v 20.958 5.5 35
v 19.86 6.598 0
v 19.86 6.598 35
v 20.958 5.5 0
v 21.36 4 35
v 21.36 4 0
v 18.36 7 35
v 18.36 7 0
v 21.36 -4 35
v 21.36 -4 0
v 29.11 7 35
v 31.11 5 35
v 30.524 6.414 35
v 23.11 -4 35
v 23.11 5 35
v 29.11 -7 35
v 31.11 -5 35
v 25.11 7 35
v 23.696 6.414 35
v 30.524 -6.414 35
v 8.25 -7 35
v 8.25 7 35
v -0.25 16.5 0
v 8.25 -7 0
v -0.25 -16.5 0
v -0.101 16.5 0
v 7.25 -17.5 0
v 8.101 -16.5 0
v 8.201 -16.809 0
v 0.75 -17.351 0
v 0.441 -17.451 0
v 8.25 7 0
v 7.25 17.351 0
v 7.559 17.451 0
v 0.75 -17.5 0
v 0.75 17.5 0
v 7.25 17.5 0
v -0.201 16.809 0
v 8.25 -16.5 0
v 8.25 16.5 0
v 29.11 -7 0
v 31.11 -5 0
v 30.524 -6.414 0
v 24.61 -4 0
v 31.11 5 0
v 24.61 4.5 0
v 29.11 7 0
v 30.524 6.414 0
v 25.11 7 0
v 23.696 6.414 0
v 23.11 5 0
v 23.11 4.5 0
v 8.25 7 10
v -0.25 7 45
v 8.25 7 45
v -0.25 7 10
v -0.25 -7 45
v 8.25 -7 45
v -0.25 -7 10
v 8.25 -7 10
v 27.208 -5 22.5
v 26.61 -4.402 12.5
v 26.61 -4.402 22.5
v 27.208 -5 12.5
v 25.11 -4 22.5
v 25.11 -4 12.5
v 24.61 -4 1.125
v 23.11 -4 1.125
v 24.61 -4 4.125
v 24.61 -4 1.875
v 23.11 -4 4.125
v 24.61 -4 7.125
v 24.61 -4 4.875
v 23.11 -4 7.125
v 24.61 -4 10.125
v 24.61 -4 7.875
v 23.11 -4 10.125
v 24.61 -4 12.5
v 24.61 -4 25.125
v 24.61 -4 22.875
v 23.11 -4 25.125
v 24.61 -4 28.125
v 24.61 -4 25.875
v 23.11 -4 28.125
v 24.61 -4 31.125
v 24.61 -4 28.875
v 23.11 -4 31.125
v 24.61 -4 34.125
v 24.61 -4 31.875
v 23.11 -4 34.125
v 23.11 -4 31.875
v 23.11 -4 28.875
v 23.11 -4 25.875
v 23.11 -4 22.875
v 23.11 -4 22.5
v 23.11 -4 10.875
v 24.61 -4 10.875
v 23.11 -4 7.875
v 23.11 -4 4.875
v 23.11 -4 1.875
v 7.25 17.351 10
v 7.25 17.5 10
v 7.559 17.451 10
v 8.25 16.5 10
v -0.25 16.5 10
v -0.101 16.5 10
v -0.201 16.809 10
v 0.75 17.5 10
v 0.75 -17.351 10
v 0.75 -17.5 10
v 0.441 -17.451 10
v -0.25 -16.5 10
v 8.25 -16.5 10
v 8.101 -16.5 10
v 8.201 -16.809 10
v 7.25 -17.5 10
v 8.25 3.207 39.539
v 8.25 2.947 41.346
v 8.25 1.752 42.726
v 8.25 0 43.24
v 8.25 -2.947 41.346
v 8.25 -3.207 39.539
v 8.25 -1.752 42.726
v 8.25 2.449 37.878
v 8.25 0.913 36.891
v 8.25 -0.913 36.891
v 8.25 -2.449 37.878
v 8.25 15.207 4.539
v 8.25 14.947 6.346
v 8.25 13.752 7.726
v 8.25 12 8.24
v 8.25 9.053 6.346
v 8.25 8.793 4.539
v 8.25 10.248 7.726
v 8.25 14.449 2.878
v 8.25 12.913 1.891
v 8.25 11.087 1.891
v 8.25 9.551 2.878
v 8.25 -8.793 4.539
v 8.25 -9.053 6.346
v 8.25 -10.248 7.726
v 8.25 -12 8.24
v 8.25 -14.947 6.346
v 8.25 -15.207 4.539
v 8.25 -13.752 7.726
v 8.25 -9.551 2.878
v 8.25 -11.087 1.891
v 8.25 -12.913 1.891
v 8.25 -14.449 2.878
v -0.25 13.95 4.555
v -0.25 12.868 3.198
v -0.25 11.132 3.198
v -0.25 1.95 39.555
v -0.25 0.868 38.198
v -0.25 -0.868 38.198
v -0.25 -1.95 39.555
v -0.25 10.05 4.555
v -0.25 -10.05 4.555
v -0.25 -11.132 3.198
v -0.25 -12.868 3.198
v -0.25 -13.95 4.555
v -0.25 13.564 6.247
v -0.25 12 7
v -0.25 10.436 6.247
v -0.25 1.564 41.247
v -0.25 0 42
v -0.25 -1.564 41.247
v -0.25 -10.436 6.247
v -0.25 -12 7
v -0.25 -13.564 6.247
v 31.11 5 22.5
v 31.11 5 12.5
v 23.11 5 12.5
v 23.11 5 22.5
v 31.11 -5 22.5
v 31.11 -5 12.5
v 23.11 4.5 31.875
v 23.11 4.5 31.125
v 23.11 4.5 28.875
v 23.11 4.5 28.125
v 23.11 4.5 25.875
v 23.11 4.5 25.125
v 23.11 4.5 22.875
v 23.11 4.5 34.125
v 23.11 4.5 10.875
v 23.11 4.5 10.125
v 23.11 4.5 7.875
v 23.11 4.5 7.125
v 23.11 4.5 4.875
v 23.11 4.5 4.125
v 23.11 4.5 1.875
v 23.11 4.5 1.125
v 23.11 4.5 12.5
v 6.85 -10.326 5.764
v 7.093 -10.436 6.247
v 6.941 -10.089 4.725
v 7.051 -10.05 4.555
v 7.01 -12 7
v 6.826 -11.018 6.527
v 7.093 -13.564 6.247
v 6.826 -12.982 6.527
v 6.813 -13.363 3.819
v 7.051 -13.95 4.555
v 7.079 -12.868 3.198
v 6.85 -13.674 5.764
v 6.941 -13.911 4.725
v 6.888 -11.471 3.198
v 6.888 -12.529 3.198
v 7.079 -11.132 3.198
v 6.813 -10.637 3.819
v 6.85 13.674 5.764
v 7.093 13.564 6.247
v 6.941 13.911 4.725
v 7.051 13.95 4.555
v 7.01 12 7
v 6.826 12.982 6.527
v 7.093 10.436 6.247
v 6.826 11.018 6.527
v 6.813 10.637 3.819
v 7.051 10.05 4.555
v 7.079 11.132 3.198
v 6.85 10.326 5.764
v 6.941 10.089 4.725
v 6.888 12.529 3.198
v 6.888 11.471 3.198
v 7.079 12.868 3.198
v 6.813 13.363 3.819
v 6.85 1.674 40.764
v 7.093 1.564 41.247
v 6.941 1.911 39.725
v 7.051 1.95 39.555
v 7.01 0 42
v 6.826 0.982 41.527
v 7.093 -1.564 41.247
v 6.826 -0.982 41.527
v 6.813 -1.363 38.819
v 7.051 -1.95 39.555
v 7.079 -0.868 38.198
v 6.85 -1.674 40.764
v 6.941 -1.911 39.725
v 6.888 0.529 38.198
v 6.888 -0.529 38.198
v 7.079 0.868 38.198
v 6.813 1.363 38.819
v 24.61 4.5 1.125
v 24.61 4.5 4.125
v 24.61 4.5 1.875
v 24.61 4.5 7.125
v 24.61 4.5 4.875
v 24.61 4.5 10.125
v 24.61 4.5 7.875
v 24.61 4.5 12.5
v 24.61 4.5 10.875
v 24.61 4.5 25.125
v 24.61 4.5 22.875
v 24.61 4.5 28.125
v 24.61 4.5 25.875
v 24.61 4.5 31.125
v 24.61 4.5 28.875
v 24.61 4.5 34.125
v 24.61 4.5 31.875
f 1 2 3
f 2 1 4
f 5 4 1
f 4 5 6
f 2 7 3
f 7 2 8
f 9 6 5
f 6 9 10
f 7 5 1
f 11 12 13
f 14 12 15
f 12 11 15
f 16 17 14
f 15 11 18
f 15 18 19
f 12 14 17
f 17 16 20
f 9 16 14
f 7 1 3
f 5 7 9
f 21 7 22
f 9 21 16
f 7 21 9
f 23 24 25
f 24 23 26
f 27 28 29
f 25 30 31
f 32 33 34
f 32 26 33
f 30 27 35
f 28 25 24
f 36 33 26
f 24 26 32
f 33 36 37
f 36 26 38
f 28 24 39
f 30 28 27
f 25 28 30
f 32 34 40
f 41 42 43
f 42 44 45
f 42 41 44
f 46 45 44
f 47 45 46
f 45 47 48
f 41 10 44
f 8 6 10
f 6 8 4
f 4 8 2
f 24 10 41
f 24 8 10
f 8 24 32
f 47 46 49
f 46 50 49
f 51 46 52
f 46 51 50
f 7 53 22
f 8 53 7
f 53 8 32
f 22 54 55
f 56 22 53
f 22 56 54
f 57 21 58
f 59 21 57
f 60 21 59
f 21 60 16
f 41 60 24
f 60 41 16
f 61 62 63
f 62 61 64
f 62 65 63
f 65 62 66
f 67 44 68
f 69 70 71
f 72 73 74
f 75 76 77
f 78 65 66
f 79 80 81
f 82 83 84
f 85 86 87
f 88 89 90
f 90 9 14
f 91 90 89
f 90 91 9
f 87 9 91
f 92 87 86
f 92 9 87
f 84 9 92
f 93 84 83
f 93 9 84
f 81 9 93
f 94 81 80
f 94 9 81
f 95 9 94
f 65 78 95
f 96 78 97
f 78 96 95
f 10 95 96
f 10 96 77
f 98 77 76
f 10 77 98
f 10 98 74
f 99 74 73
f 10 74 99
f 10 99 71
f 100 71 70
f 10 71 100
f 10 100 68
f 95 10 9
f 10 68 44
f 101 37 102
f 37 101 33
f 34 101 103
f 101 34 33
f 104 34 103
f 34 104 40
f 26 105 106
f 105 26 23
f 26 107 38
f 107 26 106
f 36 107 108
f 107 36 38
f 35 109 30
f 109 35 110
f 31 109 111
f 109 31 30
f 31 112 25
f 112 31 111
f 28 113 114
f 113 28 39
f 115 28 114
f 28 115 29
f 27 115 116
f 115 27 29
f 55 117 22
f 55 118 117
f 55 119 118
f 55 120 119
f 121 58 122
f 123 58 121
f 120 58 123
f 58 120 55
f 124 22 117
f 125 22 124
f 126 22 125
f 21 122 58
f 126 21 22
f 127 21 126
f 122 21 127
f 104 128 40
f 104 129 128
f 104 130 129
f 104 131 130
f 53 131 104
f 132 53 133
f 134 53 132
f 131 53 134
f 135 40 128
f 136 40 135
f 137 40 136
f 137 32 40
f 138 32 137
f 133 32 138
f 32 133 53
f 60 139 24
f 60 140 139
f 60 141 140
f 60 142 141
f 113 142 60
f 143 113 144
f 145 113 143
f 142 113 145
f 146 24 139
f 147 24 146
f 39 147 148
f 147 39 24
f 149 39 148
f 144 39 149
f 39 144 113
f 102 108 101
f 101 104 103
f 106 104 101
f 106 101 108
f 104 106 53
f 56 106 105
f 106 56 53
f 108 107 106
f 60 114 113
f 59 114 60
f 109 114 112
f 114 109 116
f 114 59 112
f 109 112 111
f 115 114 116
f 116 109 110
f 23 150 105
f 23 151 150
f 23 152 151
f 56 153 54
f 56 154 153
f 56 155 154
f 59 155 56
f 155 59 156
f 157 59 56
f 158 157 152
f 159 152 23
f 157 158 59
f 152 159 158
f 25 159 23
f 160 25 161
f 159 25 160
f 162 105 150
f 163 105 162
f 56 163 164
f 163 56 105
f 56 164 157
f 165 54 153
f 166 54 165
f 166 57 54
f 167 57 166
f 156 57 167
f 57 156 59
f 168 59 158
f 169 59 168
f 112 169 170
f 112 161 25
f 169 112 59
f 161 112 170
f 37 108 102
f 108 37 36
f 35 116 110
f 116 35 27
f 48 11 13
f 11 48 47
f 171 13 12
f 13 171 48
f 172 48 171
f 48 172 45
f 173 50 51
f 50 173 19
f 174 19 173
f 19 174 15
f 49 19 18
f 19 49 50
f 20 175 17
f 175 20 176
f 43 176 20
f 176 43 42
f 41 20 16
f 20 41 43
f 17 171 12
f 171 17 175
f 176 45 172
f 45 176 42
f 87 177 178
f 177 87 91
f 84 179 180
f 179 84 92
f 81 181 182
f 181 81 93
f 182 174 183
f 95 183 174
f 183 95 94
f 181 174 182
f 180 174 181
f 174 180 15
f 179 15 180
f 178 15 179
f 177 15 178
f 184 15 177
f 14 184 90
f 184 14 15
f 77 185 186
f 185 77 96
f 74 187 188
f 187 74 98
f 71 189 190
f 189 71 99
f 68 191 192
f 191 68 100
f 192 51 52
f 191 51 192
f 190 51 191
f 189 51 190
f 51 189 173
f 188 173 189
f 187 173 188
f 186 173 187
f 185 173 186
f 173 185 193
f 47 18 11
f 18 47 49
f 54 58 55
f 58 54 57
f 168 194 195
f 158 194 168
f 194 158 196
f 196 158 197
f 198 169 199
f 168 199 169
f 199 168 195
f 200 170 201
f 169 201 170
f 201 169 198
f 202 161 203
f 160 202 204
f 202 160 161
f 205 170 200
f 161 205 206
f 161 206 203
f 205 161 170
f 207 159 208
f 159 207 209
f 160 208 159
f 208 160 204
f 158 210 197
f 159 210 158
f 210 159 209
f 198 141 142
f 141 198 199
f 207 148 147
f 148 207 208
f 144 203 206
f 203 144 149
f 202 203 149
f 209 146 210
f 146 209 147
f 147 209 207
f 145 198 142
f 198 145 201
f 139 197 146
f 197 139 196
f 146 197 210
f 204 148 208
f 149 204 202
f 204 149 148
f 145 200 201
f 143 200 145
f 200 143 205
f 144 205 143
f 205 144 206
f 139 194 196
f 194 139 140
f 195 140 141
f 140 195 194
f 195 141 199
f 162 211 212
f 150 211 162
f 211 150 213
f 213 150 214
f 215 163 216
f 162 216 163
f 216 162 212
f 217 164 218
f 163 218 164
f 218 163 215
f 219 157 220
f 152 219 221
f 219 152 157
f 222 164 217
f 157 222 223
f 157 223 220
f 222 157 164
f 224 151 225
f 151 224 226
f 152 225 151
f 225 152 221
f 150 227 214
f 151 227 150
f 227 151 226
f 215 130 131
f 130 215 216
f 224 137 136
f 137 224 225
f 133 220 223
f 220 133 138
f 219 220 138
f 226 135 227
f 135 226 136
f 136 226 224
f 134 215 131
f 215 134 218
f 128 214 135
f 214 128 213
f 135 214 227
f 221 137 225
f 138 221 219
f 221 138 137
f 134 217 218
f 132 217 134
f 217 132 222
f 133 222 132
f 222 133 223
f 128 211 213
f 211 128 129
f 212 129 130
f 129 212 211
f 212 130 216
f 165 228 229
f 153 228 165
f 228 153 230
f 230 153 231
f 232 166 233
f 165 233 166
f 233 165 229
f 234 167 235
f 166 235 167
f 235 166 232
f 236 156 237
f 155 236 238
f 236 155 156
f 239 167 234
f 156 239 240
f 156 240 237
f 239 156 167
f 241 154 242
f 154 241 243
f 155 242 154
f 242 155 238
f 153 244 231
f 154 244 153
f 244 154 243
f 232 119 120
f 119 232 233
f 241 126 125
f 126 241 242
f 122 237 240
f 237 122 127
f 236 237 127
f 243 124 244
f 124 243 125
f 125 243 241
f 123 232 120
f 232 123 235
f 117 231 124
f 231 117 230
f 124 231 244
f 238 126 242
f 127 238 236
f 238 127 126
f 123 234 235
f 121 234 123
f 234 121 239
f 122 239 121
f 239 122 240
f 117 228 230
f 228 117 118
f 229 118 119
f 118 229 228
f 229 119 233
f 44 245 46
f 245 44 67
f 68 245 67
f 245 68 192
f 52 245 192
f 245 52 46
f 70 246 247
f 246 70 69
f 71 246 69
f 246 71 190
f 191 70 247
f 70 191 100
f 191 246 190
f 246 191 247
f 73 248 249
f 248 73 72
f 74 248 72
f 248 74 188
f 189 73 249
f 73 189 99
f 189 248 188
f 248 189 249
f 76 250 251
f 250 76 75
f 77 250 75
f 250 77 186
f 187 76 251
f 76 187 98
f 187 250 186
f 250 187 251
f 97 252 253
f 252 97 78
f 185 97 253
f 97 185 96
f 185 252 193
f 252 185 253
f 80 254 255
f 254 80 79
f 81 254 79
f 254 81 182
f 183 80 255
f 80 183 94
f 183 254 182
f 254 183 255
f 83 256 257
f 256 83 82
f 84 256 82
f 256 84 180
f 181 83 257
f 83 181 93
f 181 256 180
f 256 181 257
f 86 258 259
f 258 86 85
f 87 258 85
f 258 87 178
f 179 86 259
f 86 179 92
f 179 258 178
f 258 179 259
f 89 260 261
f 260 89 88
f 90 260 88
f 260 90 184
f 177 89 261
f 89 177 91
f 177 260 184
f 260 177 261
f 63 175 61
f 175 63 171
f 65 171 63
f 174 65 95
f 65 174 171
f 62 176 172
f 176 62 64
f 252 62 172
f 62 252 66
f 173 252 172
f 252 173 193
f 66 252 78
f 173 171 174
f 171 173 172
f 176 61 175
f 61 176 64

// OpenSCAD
// file: inc/functions.scad
// PRUSA iteration3
// Functions used in many files
// GNU GPL v3
// Josef Průša <josefprusa@me.com>
// Václav 'ax' Hůla <axtheb@gmail.com>
// Vlnofka <>
// http://www.reprap.org/wiki/Prusa_Mendel
// http://github.com/prusajr/PrusaMendel


module nut(d,h,horizontal=true){
    cornerdiameter =  (d / 2) / cos (180 / 6);
    cylinder(h = h, r = cornerdiameter, $fn = 6);
    if(horizontal){
        for(i = [1:6]){
            rotate([0,0,60*i]) translate([-cornerdiameter-0.2,0,0]) rotate([0,0,-45]) cube([2,2,h]);
        }
    }
}

module fillet(radius, height=100, $fn=0) {
    //this creates acutal fillet
    translate([-radius, -radius, -height / 2 - 0.02]) difference() {
        cube([radius * 2, radius * 2, height + 0.04]);
        if ($fn == 0 && (radius == 2 || radius == 3 || radius == 4)) {
            cylinder(r=radius, h=height + 0.04, $fn=4 * radius);
        } else {
            cylinder(r=radius, h=height + 0.04, $fn=$fn);
        }

    }
}

module cube_fillet(size, radius=-1, vertical=[3,3,3,3], top=[0,0,0,0], bottom=[0,0,0,0], center=false, $fn=0){
    //
    if (use_fillets == 1) {
        if (center) {
            cube_fillet_inside(size, radius, vertical, top, bottom, $fn);
        } else {
            translate([size[0]/2, size[1]/2, size[2]/2])
                cube_fillet_inside(size, radius, vertical, top, bottom, $fn);
        }
    } else {
        if (use_fillets == 2) {
            if (center) {
                cube_fillet_inside(size, radius, vertical, top, bottom, 4);
            } else {
                translate([size[0]/2, size[1]/2, size[2]/2])
                    cube_fillet_inside(size, radius, vertical, top, bottom, 4);
            }

        } else {
            cube(size, center);
        }
    }

}

module cube_negative_fillet(size, radius=-1, vertical=[3,3,3,3], top=[0,0,0,0], bottom=[0,0,0,0], $fn=0){

    j=[1,0,1,0];

    for (i=[0:3]) {
        if (radius > -1) {
            rotate([0, 0, 90*i]) translate([size[1-j[i]]/2, size[j[i]]/2, 0]) fillet(radius, size[2], $fn=$fn);
        } else {
            rotate([0, 0, 90*i]) translate([size[1-j[i]]/2, size[j[i]]/2, 0]) fillet(vertical[i], size[2], $fn=$fn);
        }
        rotate([90*i, -90, 0]) translate([size[2]/2, size[j[i]]/2, 0 ]) fillet(top[i], size[1-j[i]], $fn=$fn);
        rotate([90*(4-i), 90, 0]) translate([size[2]/2, size[j[i]]/2, 0]) fillet(bottom[i], size[1-j[i]], $fn=$fn);

    }
}

module cube_fillet_inside(size, radius=-1, vertical=[3,3,3,3], top=[0,0,0,0], bottom=[0,0,0,0], $fn=0){
    //makes CENTERED cube with round corners
    // if you give it radius, it will fillet vertical corners.
    //othervise use vertical, top, bottom arrays
    //when viewed from top, it starts in upper right corner (+x,+y quadrant) , goes counterclockwise
    //top/bottom fillet starts in direction of Y axis and goes CCW too


    if (radius == 0) {
        cube(size, center=true);
    } else {
        difference() {
            cube(size, center=true);
            cube_negative_fillet(size, radius, vertical, top, bottom, $fn);
        }
    }
}


module nema17(places=[1,1,1,1], size=15.5, h=10, holes=false, shadow=false, $fn=24){
    for (i=[0:3]) {
        if (places[i] == 1) {
            rotate([0, 0, 90*i]) translate([size, size, 0]) {
                if (holes) {
                    rotate([0, 0, -90*i])  translate([0,0,-10]) screw(r=1.7, slant=false, head_drop=13, $fn=$fn, h=h+12);
                } else {
                    rotate([0, 0, -90*i]) cylinder(h=h, r=5.5, $fn=$fn);
                }
            }
        }
    }
    if (shadow != false) {
        %translate ([0, 0, shadow+21+3]) cube([42,42,42], center = true);
    //flange
        %translate ([0, 0, shadow+21+3-21-1]) cylinder(r=11,h=2, center = true, $fn=20);
    //shaft
        %translate ([0, 0, shadow+21+3-21-7]) cylinder(r=2.5,h=14, center = true);
    }
}

module screw(h=20, r=2, r_head=3.5, head_drop=0, slant=i_am_box, poly=false, $fn=0){
    //makes screw with head
    //for substraction as screw hole
    if (poly) {
        cylinder_poly(h=h, r=r, $fn=$fn);
    } else {
        cylinder(h=h, r=r, $fn=$fn);
    }
    if (slant) {
        translate([0, 0, head_drop-0.01]) cylinder(h=r_head, r2=0, r1=r_head, $fn=$fn);
    }

    if (head_drop > 0) {
        translate([0, 0, -0.01]) cylinder(h=head_drop+0.01, r=r_head, $fn=$fn);
    }
}

module plate_screw(long=0) {
    if (i_am_box == 0) {
        translate([0, 0, -long]) screw(head_drop=14 + long, h=30 + long, r_head=3.6, r=1.7, $fn=24, slant=false);
    } else {
        translate([0, 0, -2 - long]) screw(head_drop=14 + long, h=30 + long, r_head=4.5, r=2, $fn=24, slant=true);
    }
}

//radius of the idler assembly (to surface that touches belt, ignoring guide walls)
function idler_assy_r_inner(idler_bearing) = (idler_bearing[0] / 2) + (6 * single_wall_width + 0.2) * idler_bearing[3];
//outer radius of the idler assembly (to smooth side of belt) 
function idler_assy_r_outer(idler_bearing) = idler_assy_r_inner(idler_bearing) + belt_thickness + 1;


module idler_assy(idler_bearing = [22, 7, 8, 1]) {

    //bearing axle
    translate([0,0,-1]) cylinder(h = 120, r=(idler_bearing[2] + 1) / 2, $fn=small_hole_segments, center=true);
    //bearing shadow
    %cylinder(h = idler_bearing[1], r=idler_bearing[0]/2, center=true);
    //belt shadow
    %cylinder(h = belt_width, r=idler_assy_r_outer(idler_bearing), center=true);

    cylinder(h = idler_width + 1, r=idler_assy_r_outer(idler_bearing) + 0.5, center=true);
}

module belt(len, side = 0){
    //belt. To be substracted from model
    //len is in +Z, smooth side in +X, Y centered
    translate([-0.5, 0, 0]) maketeeth(len);
    translate([0, -4.5, -0.01]) cube([belt_thickness, 9, len + 0.02]);
    if (side != 0) {
    translate([0, -4.5 + side, -0.01]) cube_fillet([belt_thickness, 9, len + 0.02], vertical = [3, 0, 0, 0]);
    }
}


module maketeeth(len){
    //Belt teeth. 
    for (i = [0 : len / belt_tooth_distance]) {
        translate([0, 0, i * belt_tooth_distance]) cube([2, 9, belt_tooth_distance * belt_tooth_ratio], center = true);
    }
}
// file: inc/conf_bushing.scad
// PRUSA iteration3
// Bushing and bering dimensions
// GNU GPL v3
// Václav 'ax' Hůla <axtheb@gmail.com>
// http://www.reprap.org/wiki/Prusa_Mendel
// http://github.com/prusajr/PrusaMendel
//

// each config is in form[r_rod, r, h, type, name] where:
//     r_rod  is smooth rod radius [0]
//     r is outer bushing radius needed for tight fit or bearing radius with loose fit [1]
//     h is barrel length [2]
//     type is 0 for linear bearings, 1 is for bushings which needs to be enclosed fully. [3]
//       type 1 may have flange, but type 0 not
//     name is human readable name [4]

//bushings
conf_b_bushing8 = [4, 5.1, 10, 1, "Tube shaped bushing like igus J(V)FM 0810-10"];
conf_b_bushing10 = [5, 6.1, 10, 1, "Tube shaped bushing with id=10mm, od=12mm and length of at least 10mm, like J(V)FM 1012-10"];
conf_b_bushing12 = [6, 7.1, 15, 1, "Tube shaped bushing with id=12mm, od=14mm and length of at least 15mm, like SF-1 1215"];

conf_b_bronze8 = [4, 8, 11, 1, "bronze self-aligning bushing, 8mm"];

//shorter beaings (two on each Z axis)
conf_b_lm8uu = [4, 7.7, 24, 0, "lm8uu bearing (standard)"];
conf_b_lm10uu = [5, 9.7, 29, 0, "lm10uu bearing (10mm smooth rod)"];
conf_b_lme8uu =[4, 8.2, 25, 0, "lme8uu bearing"];
conf_b_lm12uu = [6, 10.6, 30, 0, "lm12uu bearing (12mm smooth rod)"];

//longer bearings
conf_b_lm8luu = [4, 7.7, 45, 0, "lm8luu bearing (double length)"];
conf_b_lm10luu = [5, 9.7, 55, 0, "lm10luu bearing (10mm smooth rod, long)"];
conf_b_lm12luu = [6, 10.6, 57, 0, "lm12luu bearing (12mm, double length)"];


// Select idler bearing size **************************************************
// [outer_diameter, width, inner_diameter, uses_guide]

// roughly sorted by desirability

// one bearing with guides
// Select by availability, smaller is better.
bearing_623 = [10, 4, 3, 1, "623 bearing"];
bearing_624 = [13, 5, 4, 1, "624 bearing"];
bearing_625 = [16, 5, 5, 1, "625 bearing"];

// two bearings side by side - for use without bearing guides.
// Not recomended anymore
bearing_625_double = [16, 10, 5, 0, "625 bearing x2"];
bearing_624_double = [13, 10, 4, 0, "624 bearing x2"];
bearing_623_double = [10, 8, 3, 0, "623 bearing"];

// 608 [standard skate bearings] with bearing guide
bearing_608 = [22, 7, 8, 1, "608 bearing"];
// 608 bearings with fender washers.
// the belt brushes both against the carriage and the washers.
bearing_608_washers = [22, 10, 8, 0, "608 bearing"];
// file: inc/metric.scad
// PRUSA iteration3
// Default metric sizes
// GNU GPL v3
// Josef Průša <josefprusa@me.com>
// http://www.reprap.org/wiki/Prusa_Mendel
// http://github.com/prusajr/PrusaMendel

// DONT CHANGE THIS FILE! ALTER VALUES IN CONFIGURATION.SCAD INSTEAD

// RODS

threaded_rod_diameter = 8.7;
threaded_rod_diameter_horizontal = 8.7;
smooth_bar_diameter = 8;
smooth_bar_diameter_horizontal = 8.5;

// Nuts and bolts

m8_diameter = 9;
m8_nut_diameter = 14.1;

m4_diameter = 4.5;
m4_nut_diameter = 9;
m4_nut_diameter_horizontal = 10;

m3_diameter = 3.6;
m3_nut_diameter = 5.3;
m3_nut_diameter_horizontal = 6.8;
m3_washer_diameter = 6.9;

// Motors

motor_shaft = 5.5;
// file: configuration.scad
// PRUSA iteration3
// Configuration file
// GNU GPL v3
// Josef Průša <josefprusa@me.com>
// Václav 'ax' Hůla <axtheb@gmail.com>
// http://www.reprap.org/wiki/Prusa_Mendel
// http://github.com/prusajr/PrusaMendel

include <inc/metric.scad>;
include <inc/conf_bushing.scad>;

// Custom settings here, tailor to your supplies and print settings


// Extruder settings **********************************************************
// Don't forget to set your slicer's extruder settings to match the values you
// enter here.

layer_height = 0.3;
// Width over thickness determines how wide the plastic will be when extruded
// onto the object that is being printed. width_over_thickness is multiplied
// by the layer_height to calculate this width. i.e. If your layer_height is
// set to 0.3 mm and your width_over_thickness is set to 2.2, the resulting
// width will be 0.66 mm.
width_over_thickness = 2.2;

// Select your belt type ******************************************************

//T2.5
//belt_tooth_distance = 2.5;
//belt_tooth_ratio = 0.75;

//T5 (strongly discouraged)
//belt_tooth_distance = 5;
//belt_tooth_ratio = 0.75;

//HTD3
belt_tooth_distance = 3;
belt_tooth_ratio = 0.75;

//MXL
//belt_tooth_distance = 2.032;
//belt_tooth_ratio = 0.64;

//GT2 there is bunch of GT2 belts with different tooth-to-tooth distance
//adjust to your needs
//belt_tooth_distance = 2;
//belt_tooth_ratio = 0.5;

// For T type belts you will probably want 0.8mm or so.
belt_thickness = 1.75;

// Choose bearing/bushing configuration ***************************************
// conf_b_* are in inc/conf_bushing.scad

bushing_xy = conf_b_lm12luu;
bushing_z = conf_b_lm12luu;
// for longer bearings use one shorter in x-carriage to make place for belt attachment
// by default use same as xy
bushing_carriage = conf_b_lm12uu;

// Select idler bearing size **************************************************
// [outer_diameter, width, inner_diameter, uses_guide]
// 608 [standard skate bearings] with bearing guide
bearing_608 = [22, 7, 8, 1];
// 608 bearings with fender washers. Not good at all, the belt brushes against the carriage
bearing_608_washers = [22, 10, 8, 0];
// one 625 with guides
bearing_625 = [16, 5, 5, 1];
// two 625 - for use without bearing guides.
bearing_625_double = [16, 10, 5, 0];

// those two here are really good:
bearing_624_double = [13, 10, 4, 0];
// this one has roughly same diameter as pulley, makes belt parallel so its prettier
bearing_623_double = [10, 8, 3, 0];

idler_bearing = bearing_624_double;

// Select carriage lenght ******************************************************
// 30 for single carriage extruder (two holes with centers 30mm apart)
// 50 for wade or single with fan (three holes, 30-20)
// 80 for full length carriage (four holes, 30-20-30)

carriage_l_base = 80;

// Fillets ********************************************************************
// fillets are rounded corners of boxes. The right engineering term is probably radius
// but cad software calls it fillet.
// mostly cosmetic, except z axis.
// 0 = no fillets
// 1 = fillet
// 2 = chamfer (cut the edges at 45deg. angle)
// Please do put only parts with fillets on sale, other options are not really tested

use_fillets = 1;

// set to 0 for single plate (affects z axis and screws that attach RP parts to frame)
i_am_box = 1;

// if you do your own plate and can move bottom Z screws 5mm up set this to 0 to
// get stronger motor mount. Only for i_am_box = 0
i_want_to_use_single_plate_dxf_and_make_my_z_weaker = 1;


// Radius of long threaded rod on Y frame

// Affects y-axis-corner (both box and single plate)
// and y-axis-bracket (box only)

//Use 5.4 for M10 or 4.4 for M8
y_threaded_rod_long_r = 5.4;


// Thickness of the boards that make the box frame.

// in y-axis-corner it governs the height of the corners by adjusting the
// distance between ground and M10 threaded rod. (both box and single plate)

// For box model, the parts that hold Z smooth rod have one hole from front
// and one from side, and this setting makes sure that the screw from side
// is in the center of the plank.

// Use 12 for single plate
// or 20 if you want to use the Y lm8uu holders 
// (extras/bearing-holder-single-plate-y)
board_thickness = 18;

// Segments of small holes. some poeple claim that a low value makes them easier to print.
small_hole_segments=7;


// END of custom settings *****************************************************


// You are not supposed to change this
board_to_xz_distance = 26;
xaxis_rod_distance = 45;

//calculated from settings
single_wall_width = width_over_thickness * layer_height;

idler_width = (idler_bearing[1] > 7 ? idler_bearing[1] : 7) + 2.5 * idler_bearing[3] ;

//deltas are used to enlarge parts for bigger bearings 
xy_delta = ((bushing_xy[1] <= 7.7) ? 0 : bushing_xy[1] - 7.7) * 0.9;
z_delta = (bushing_z[1] <= 7.7) ? 0 : bushing_z[1] - 7.7;

// CHANGE ONLY THE STUFF YOU KNOW
// IT WILL REPLACE DEFAULT SETTING

// RODS

// threaded_rod_diameter = 0;
// threaded_rod_diameter_horizontal = 0;
// smooth_bar_diameter = 0;
// smooth_bar_diameter_horizontal = 0;

// Nuts and bolts

// m8_diameter = 0;
// m8_nut_diameter = 0;

// m4_diameter = 0;
// m4_nut_diameter = 0;

// m3_diameter = 0;
// m3_nut_diameter = 0;

// Bushing holder

// bushing_core_diameter = smooth_bar_diameter;
// bushing_material_thickness = 0;

///counted stuff
m3_nut_diameter_bigger = ((m3_nut_diameter  / 2) / cos (180 / 6))*2;

// functions
include <inc/functions.scad>

// These constants define the geometry of the complete-printer.scad

//x_smooth_rod_length=325;
//y_smooth_rod_length=405;
//z_smooth_rod_length=235;
bed_x_size=225;
bed_y_size=225;

x_smooth_rod_length=460+board_thickness*2; // 492 for 16mm thickness; 484 for 12mm thickness
y_smooth_rod_length=470;
z_smooth_rod_length=405;
// main file
// PRUSA iteration3
// Y belt holder
// GNU GPL v3
// Josef Průša <josefprusa@me.com>
// Václav 'ax' Hůla <axtheb@gmail.com>
// http://www.reprap.org/wiki/Prusa_Mendel
// http://github.com/prusajr/PrusaMendel

include <configuration.scad>
translate([28.5, 0, 0]){

    //%translate([0, 0, 35/2]) cube([20, 6, 35], center = true);
    translate([-21 - belt_thickness, -7, 0]) cube_fillet([13 + xy_delta, 14, 35], vertical=[3,0,0,0], fn=8 );
    translate([-9, -5.5, 17.5]) cube_fillet([12 + 2 * xy_delta, 3, 35], vertical=[3, 0, 0, 0], center = true);

    difference(){
        union(){

            translate([-37.5+13, 0, 5]) cube_fillet([8.5, 35, 10], center = true, radius=1, $fn=8);
            translate([-37.5+13, 0, 22.5]) cube([8.5, 14, 45], center = true);
            translate([-4.0 + xy_delta, 0, 17.5]) cube_fillet([8, 14, 35], center = true, vertical = [2,2,0,2], fn=8);

        }
        translate([-4.5 + xy_delta, 0, 17.5]) cube([10, 10, 10], center = true);
        translate([-20, -12, 5]) rotate([0, -90, 0]) screw();
        translate([-20, 12, 5]) rotate([0, -90, 0]) screw();

        translate([-20, 0, 40]) rotate([0, -90, 0]) screw();
        translate([-7.5 + xy_delta, 0, 0]) maketeeth(35);
    }
}
